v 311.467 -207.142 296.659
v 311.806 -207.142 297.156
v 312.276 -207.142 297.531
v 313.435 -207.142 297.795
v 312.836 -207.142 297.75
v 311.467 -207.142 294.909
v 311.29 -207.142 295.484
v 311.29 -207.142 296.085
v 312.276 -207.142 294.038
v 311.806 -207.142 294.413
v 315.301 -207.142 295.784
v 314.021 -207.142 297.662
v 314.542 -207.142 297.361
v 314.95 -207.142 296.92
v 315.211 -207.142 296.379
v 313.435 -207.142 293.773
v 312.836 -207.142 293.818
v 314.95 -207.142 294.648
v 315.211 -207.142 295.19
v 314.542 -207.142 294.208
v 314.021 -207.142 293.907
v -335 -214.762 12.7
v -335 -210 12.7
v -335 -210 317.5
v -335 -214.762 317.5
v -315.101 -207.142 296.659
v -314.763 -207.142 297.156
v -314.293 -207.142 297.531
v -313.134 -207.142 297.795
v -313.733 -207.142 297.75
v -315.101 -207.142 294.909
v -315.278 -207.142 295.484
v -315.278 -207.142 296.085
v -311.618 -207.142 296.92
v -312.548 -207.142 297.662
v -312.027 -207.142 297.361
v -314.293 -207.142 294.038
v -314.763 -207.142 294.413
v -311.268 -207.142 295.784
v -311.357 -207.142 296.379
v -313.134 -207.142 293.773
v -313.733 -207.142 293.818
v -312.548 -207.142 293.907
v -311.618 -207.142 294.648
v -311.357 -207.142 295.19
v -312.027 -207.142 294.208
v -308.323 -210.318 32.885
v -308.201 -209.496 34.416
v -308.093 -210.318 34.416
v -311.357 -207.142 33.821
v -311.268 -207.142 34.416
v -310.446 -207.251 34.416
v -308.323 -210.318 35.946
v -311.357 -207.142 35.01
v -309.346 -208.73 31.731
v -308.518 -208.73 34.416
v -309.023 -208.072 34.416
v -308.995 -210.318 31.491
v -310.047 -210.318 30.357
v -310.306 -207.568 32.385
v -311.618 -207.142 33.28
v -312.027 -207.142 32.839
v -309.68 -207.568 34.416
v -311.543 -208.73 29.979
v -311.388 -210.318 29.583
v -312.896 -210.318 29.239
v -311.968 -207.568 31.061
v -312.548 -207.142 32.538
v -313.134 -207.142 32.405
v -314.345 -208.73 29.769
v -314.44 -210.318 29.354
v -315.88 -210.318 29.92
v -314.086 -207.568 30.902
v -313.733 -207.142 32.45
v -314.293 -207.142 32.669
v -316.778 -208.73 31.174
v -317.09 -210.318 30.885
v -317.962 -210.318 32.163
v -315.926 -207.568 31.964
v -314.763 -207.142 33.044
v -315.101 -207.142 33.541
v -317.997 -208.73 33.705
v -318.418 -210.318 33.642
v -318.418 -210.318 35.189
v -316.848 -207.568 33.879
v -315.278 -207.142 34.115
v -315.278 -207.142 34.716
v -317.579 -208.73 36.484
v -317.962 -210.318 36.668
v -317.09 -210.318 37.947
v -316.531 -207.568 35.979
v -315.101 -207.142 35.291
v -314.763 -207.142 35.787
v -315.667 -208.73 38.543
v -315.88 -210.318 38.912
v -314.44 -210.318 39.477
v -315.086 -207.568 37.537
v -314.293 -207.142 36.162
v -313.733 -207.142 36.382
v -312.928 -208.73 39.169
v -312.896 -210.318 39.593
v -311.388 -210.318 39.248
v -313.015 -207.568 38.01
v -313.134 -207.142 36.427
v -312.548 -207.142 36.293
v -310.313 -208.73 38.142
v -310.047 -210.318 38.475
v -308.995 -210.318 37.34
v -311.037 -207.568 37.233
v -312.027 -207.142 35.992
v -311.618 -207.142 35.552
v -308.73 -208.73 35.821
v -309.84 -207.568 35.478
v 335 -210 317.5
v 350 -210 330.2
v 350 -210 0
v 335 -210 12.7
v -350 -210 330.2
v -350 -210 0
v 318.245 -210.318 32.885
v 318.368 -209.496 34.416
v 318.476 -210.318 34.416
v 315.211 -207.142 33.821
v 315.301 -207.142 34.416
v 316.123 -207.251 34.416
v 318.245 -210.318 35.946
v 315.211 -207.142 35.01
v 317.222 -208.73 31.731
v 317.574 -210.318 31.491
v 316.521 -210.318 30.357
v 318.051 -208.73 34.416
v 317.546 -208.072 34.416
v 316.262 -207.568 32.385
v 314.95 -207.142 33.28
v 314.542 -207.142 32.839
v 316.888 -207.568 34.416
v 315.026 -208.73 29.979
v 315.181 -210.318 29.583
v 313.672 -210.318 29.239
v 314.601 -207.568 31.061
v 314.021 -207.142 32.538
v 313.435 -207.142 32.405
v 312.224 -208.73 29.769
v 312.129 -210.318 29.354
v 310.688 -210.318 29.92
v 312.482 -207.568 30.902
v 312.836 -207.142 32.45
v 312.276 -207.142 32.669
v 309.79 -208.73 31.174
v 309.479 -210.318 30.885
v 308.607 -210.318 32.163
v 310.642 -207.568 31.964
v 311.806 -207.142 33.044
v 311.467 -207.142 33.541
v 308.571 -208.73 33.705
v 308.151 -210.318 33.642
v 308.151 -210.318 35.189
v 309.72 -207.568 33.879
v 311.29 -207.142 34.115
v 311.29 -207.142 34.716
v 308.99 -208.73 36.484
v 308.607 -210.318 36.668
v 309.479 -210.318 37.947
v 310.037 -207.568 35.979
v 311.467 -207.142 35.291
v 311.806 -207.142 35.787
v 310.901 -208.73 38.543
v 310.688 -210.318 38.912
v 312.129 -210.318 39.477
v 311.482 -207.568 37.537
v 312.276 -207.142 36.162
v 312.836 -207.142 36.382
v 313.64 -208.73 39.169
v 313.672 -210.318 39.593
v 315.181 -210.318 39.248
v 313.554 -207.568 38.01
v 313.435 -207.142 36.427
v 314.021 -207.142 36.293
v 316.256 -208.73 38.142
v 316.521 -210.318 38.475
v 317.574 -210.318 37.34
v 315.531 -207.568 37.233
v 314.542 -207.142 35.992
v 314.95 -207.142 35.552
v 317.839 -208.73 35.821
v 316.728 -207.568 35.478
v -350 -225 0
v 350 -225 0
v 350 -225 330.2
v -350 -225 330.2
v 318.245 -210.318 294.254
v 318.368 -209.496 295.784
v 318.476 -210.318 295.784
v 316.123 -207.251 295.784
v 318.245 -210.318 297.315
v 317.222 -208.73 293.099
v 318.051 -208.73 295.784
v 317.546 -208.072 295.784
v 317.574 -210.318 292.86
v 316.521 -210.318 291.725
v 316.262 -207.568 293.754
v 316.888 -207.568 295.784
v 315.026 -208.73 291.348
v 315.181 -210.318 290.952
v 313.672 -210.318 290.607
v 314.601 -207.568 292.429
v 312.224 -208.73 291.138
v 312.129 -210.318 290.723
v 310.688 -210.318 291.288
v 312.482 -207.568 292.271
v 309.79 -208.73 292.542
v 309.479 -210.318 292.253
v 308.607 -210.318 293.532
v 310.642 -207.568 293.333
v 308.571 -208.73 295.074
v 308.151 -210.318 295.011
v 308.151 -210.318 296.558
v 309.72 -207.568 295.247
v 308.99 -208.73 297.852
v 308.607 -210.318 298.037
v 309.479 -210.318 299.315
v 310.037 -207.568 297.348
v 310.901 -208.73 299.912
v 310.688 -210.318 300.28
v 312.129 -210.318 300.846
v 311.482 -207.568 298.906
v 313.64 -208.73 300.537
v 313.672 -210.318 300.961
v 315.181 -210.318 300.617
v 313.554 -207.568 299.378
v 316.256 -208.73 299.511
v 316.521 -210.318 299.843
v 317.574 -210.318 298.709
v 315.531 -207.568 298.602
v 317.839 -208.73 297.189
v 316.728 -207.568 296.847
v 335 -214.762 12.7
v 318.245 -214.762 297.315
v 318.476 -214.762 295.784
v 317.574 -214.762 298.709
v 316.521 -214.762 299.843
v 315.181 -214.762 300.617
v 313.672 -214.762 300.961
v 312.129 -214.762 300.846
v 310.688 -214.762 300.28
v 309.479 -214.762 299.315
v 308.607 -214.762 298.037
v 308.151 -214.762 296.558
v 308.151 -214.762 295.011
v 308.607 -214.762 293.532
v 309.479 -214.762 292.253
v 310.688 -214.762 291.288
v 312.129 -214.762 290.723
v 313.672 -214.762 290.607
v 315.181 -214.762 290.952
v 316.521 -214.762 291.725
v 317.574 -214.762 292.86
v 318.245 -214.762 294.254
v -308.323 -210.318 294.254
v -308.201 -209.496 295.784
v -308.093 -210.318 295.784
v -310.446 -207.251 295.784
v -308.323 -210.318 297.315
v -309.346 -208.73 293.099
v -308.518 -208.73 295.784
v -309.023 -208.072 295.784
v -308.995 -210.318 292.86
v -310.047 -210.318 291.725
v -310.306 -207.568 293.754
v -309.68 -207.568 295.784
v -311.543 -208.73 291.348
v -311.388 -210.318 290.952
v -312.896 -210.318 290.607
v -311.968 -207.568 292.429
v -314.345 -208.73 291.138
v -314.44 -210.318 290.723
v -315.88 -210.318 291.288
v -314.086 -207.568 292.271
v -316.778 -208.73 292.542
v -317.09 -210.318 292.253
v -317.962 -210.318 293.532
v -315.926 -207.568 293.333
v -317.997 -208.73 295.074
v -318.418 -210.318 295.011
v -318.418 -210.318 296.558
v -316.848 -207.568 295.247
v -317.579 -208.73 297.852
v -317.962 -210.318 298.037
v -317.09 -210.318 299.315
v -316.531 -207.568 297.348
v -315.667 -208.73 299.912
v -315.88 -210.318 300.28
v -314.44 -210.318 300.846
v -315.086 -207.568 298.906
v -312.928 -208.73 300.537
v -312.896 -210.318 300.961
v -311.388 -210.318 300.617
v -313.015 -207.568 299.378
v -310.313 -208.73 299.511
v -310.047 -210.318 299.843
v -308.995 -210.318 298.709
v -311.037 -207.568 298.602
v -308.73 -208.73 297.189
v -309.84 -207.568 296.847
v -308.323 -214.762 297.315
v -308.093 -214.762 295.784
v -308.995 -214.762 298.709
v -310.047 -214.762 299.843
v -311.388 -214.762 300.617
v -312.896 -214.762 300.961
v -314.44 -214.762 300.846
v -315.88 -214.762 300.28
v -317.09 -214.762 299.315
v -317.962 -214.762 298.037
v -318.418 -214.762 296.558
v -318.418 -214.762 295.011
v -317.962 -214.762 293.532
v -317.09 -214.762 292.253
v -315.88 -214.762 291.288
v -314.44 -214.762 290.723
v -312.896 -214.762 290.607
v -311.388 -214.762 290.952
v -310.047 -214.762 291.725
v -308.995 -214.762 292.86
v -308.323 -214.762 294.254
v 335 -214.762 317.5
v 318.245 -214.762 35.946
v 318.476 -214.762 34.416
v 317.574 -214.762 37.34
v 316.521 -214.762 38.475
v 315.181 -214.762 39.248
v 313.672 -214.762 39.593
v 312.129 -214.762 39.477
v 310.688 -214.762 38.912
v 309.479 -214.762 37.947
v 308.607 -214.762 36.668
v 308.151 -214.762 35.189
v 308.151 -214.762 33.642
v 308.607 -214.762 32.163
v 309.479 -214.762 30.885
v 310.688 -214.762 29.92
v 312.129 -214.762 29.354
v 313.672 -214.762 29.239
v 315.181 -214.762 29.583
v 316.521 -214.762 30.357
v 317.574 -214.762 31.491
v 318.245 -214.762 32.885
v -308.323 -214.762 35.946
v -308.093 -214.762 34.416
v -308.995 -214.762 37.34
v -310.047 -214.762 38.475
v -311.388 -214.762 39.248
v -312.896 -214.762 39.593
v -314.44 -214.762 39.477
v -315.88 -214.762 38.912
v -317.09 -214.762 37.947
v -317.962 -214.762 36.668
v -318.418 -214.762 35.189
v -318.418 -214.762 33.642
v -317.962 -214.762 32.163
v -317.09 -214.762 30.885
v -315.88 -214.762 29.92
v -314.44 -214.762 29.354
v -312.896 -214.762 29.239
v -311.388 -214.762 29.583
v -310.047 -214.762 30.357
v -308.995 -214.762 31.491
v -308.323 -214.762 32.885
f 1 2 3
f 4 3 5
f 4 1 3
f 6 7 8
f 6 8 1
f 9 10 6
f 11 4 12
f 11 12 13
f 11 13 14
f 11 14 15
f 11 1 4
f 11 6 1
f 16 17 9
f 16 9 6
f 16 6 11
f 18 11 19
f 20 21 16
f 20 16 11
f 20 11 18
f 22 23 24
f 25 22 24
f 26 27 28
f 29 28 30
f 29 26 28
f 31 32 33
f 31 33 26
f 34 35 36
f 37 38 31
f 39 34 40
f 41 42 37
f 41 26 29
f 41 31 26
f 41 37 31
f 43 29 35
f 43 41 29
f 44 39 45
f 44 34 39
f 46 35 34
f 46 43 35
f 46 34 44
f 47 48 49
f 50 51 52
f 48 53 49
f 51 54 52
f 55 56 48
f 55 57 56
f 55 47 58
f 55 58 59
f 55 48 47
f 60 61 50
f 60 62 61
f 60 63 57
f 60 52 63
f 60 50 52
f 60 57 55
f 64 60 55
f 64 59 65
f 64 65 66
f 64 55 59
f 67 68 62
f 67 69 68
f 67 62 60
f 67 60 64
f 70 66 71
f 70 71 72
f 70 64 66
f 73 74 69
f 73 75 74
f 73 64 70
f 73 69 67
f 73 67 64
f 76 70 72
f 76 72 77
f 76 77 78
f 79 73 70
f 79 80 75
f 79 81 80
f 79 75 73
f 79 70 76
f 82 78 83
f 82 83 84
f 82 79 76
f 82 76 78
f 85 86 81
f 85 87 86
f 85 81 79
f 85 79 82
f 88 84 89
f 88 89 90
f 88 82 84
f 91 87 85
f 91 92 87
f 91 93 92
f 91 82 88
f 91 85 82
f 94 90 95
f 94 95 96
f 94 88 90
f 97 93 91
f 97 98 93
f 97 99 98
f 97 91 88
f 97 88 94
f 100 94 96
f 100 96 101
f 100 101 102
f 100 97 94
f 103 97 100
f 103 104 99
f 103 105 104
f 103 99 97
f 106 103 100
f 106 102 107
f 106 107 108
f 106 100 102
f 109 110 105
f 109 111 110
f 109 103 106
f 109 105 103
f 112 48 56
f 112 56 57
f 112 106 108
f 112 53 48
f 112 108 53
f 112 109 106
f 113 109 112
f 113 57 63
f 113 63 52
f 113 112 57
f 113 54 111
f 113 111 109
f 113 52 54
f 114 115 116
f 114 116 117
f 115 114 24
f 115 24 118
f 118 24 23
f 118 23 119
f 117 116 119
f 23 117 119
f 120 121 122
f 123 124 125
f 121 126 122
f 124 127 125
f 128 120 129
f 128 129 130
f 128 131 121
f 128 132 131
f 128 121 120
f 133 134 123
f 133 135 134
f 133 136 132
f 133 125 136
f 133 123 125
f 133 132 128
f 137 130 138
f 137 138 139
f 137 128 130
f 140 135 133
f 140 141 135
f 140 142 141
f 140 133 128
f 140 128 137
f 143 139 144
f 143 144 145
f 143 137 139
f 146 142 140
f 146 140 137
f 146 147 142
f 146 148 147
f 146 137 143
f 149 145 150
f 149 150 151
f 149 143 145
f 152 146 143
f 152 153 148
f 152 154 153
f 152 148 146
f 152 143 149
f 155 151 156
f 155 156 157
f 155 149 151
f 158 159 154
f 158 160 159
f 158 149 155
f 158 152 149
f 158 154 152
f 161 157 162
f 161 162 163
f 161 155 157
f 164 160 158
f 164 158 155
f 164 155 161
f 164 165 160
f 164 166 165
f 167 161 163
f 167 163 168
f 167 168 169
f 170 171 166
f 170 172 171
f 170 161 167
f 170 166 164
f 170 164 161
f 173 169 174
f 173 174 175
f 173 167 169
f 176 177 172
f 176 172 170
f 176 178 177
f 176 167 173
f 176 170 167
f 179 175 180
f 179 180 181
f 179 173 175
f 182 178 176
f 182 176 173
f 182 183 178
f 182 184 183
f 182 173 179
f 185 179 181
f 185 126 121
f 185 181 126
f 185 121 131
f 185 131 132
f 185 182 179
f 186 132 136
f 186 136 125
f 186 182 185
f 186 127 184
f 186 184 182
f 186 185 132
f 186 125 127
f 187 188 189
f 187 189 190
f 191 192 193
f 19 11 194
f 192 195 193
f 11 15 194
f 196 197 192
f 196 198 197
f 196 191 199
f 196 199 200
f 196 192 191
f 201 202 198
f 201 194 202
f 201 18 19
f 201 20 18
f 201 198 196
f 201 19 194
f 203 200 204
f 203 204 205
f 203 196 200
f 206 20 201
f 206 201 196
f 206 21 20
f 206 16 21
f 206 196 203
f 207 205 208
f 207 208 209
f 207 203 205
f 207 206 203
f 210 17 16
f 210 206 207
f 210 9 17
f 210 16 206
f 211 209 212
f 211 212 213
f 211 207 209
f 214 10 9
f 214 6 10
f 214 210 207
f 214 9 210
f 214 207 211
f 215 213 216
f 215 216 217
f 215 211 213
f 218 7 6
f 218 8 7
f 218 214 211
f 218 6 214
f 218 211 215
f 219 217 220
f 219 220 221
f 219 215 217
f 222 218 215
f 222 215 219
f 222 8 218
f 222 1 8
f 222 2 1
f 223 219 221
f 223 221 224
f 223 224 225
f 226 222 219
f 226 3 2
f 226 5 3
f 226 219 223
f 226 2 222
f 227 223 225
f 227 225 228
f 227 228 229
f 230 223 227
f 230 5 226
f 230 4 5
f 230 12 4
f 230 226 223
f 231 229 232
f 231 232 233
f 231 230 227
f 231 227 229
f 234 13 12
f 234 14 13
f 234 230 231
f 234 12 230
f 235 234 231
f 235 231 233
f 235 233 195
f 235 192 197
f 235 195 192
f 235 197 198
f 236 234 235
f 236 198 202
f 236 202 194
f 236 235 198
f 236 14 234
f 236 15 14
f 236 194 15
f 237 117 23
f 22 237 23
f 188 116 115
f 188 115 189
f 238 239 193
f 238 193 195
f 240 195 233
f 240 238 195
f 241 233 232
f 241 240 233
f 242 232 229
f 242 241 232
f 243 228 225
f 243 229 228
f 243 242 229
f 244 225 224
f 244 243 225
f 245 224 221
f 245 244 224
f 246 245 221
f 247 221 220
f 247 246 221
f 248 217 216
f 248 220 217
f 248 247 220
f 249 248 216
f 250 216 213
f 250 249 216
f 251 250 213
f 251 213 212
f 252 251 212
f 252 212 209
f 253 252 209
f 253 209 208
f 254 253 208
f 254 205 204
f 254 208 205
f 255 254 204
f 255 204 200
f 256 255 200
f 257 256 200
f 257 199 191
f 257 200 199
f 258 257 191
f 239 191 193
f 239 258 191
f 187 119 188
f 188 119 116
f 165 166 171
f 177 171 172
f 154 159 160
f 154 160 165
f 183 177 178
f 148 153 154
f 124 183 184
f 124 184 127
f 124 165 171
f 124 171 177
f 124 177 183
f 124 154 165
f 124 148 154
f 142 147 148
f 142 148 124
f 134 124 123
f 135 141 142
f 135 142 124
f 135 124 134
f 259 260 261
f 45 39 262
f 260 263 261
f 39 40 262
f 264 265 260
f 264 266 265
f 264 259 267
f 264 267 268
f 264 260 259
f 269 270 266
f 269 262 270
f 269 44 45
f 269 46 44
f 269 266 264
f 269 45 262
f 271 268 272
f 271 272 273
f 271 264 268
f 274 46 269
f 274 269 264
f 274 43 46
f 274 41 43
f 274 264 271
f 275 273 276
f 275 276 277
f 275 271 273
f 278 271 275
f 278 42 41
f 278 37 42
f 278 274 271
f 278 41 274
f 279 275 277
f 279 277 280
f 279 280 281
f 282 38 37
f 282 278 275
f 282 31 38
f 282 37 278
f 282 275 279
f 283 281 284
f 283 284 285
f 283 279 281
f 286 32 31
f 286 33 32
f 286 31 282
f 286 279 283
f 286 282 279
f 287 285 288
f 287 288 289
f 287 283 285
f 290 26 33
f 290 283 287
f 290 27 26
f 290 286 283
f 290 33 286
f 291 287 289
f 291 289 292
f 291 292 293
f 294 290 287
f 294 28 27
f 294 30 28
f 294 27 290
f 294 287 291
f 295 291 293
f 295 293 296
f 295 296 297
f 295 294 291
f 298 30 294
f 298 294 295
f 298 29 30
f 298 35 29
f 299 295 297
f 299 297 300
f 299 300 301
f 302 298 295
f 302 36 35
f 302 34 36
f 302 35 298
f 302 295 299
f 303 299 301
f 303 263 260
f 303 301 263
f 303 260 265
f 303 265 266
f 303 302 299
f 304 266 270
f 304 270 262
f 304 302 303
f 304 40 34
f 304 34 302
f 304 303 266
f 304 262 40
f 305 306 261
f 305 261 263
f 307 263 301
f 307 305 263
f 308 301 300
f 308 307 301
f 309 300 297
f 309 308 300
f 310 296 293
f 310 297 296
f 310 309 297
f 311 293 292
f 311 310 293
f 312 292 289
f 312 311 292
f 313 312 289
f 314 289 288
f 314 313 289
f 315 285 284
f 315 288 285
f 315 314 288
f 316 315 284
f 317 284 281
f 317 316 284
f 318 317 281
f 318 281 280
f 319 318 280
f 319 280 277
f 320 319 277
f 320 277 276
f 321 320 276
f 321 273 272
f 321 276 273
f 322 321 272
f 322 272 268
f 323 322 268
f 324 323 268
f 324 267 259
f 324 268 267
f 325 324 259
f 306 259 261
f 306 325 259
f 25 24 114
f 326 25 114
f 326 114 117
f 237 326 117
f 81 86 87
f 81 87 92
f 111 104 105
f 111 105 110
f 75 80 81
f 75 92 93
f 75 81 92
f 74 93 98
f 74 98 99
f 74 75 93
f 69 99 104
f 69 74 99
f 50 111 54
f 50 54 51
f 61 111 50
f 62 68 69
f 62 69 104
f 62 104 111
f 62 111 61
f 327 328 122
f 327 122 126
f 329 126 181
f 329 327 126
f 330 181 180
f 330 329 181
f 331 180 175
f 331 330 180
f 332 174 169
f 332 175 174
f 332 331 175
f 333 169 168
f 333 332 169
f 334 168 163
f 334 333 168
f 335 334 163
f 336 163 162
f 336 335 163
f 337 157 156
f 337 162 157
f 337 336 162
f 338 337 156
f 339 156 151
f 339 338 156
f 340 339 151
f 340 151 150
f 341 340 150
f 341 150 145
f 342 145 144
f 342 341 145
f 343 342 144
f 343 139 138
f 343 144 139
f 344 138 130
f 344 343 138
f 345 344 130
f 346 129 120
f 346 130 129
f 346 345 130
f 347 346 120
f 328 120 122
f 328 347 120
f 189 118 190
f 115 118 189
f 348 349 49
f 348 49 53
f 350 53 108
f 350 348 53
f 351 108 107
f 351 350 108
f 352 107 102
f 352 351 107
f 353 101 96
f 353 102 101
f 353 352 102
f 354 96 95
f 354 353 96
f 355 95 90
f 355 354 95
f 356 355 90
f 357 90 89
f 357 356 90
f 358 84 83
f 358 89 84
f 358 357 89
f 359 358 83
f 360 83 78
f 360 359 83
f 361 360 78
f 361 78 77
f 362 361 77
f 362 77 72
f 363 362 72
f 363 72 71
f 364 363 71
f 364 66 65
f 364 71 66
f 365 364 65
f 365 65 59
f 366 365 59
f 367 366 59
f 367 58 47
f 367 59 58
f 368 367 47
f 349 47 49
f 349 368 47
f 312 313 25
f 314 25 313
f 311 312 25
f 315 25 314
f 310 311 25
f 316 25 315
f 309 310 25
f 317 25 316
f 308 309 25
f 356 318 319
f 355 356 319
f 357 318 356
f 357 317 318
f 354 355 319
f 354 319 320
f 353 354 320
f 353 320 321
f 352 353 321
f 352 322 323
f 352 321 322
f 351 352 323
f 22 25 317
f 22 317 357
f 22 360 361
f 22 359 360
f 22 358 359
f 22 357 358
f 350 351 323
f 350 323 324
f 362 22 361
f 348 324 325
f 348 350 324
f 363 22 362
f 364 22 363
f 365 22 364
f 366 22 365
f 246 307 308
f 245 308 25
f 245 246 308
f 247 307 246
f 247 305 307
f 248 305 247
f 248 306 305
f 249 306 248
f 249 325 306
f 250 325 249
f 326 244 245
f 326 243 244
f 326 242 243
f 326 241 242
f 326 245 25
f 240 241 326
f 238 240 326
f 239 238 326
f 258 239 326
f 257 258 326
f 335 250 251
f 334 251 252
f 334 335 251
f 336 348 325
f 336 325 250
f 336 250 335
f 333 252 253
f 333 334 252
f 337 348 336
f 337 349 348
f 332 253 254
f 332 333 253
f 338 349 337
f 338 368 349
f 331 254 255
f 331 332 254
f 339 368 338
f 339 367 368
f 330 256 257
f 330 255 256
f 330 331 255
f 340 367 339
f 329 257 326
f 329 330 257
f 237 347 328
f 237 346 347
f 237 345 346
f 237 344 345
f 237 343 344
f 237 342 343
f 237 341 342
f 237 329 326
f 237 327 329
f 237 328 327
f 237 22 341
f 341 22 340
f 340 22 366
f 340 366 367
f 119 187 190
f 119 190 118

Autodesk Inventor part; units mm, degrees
ref_plane "YZ Plane" through (0, 0, 0) normal (1, 0, 0) x (0, 1, 0)
ref_plane "XZ Plane" through (0, 0, 0) normal (0, 1, 0) x (-1, 0, 0)
ref_plane "XY Plane" through (0, 0, 0) normal (0, 0, 1) x (1, 0, 0)
sketch "Sketch1" plane through (0, 0, 0) normal (0, 0, 1) x (1, 0, 0)
  line L0 (350, -225) -> (-350, -225) projected
  line L1 (-335, 210) -> (335, 210) projected
  line L2 (335, 210) -> (335, -210) projected
  line L3 (335, -210) -> (-335, -210) projected
  line L4 (-335, -210) -> (-335, 210) projected
  line L5 (350, -225) -> (-350, -225) projected
  line L6 (350, 225) -> (350, -225) projected
  line L7 (-350, 225) -> (350, 225) projected
  line L8 (-350, -225) -> (-350, 225) projected
  line L9 (350, -210) -> (-350, -210)
  line L10 (-350, -225) -> (350, -225)
  point P0 (0, 0)
extrude "Extrusion1" add sketch "Sketch1" along normal blind 330.2 contours L0 L8 L9 L3 L6
sketch "Sketch2" plane through (-350, -210, 0) normal (0, 1, 0) x (1, 0, 0)
  line L0 (0, -330.2) -> (700, -330.2) projected
  line L1 (700, 0) -> (700, -330.2) projected
  line L2 (700, 0) -> (0, 0) projected
  line L3 (0, 0) -> (0, -330.2) projected
  line L4 (15, 0) -> (685, 0) projected
  line L5 (15, 0) -> (15, -330.2) construction
  line L6 (685, 0) -> (685, -330.2) construction
  line L7 (0, -12.7) -> (700, -12.7) construction
  line L8 (0, -317.5) -> (700, -317.5) construction
  line L9 (15, -12.7) -> (685, -12.7) construction
  line L10 (685, -12.7) -> (685, -317.5) construction
  line L11 (685, -317.5) -> (15, -317.5) construction
  line L12 (15, -317.5) -> (15, -12.7) construction
  line L13 (15, -317.5) -> (685, -317.5)
  line L14 (685, -317.5) -> (685, -12.7)
  line L15 (685, -12.7) -> (15, -12.7)
  line L16 (15, -12.7) -> (15, -317.5)
  point P0 (350, 0)
  dimension "d2" = 12.7
  dimension "d3" = 12.7
extrude "Extrusion2" cut sketch "Sketch2" against normal blind 4.7625 contours L16 L15 L14 L13
sketch "Sketch3" plane through (-350, -214.7625, 0) normal (0, 1, 0) x (1, 0, 0)
  line L0 (685, -12.7) -> (15, -12.7) projected
  line L1 (15, -12.7) -> (15, -317.5) projected
  line L2 (15, -317.5) -> (685, -317.5) projected
  line L3 (685, -317.5) -> (685, -12.7) projected
  line L4 (36.7157, -34.4157) -> (663.2843, -34.4157) construction
  line L5 (663.2843, -34.4157) -> (663.2843, -295.7843) construction
  line L6 (663.2843, -295.7843) -> (36.7157, -295.7843) construction
  line L7 (36.7157, -295.7843) -> (36.7157, -34.4157) construction
  circle A0 centre (36.7157, -34.4157) radius 5.1916
  circle A1 centre (663.2843, -34.4157) radius 5.1916
  circle A2 centre (663.2843, -295.7843) radius 5.1916
  circle A3 centre (36.7157, -295.7843) radius 5.1916
  point P0 (350, 0)
  dimension "d6" = 21.7157
  dimension "d7" = 10.3831
extrude "Extrusion3" add sketch "Sketch3" along normal blind 7.62 contours A0 | A1 | A2 | A3
fillet "Fillet1" radius 3.175 4 edges at (308.0927, -207.1425, 34.4157) (308.0927, -207.1425, 295.7843) (-318.4758, -207.1425, 295.7843) (-318.4758, -207.1425, 34.4157)
properties part number "BoxCover"
